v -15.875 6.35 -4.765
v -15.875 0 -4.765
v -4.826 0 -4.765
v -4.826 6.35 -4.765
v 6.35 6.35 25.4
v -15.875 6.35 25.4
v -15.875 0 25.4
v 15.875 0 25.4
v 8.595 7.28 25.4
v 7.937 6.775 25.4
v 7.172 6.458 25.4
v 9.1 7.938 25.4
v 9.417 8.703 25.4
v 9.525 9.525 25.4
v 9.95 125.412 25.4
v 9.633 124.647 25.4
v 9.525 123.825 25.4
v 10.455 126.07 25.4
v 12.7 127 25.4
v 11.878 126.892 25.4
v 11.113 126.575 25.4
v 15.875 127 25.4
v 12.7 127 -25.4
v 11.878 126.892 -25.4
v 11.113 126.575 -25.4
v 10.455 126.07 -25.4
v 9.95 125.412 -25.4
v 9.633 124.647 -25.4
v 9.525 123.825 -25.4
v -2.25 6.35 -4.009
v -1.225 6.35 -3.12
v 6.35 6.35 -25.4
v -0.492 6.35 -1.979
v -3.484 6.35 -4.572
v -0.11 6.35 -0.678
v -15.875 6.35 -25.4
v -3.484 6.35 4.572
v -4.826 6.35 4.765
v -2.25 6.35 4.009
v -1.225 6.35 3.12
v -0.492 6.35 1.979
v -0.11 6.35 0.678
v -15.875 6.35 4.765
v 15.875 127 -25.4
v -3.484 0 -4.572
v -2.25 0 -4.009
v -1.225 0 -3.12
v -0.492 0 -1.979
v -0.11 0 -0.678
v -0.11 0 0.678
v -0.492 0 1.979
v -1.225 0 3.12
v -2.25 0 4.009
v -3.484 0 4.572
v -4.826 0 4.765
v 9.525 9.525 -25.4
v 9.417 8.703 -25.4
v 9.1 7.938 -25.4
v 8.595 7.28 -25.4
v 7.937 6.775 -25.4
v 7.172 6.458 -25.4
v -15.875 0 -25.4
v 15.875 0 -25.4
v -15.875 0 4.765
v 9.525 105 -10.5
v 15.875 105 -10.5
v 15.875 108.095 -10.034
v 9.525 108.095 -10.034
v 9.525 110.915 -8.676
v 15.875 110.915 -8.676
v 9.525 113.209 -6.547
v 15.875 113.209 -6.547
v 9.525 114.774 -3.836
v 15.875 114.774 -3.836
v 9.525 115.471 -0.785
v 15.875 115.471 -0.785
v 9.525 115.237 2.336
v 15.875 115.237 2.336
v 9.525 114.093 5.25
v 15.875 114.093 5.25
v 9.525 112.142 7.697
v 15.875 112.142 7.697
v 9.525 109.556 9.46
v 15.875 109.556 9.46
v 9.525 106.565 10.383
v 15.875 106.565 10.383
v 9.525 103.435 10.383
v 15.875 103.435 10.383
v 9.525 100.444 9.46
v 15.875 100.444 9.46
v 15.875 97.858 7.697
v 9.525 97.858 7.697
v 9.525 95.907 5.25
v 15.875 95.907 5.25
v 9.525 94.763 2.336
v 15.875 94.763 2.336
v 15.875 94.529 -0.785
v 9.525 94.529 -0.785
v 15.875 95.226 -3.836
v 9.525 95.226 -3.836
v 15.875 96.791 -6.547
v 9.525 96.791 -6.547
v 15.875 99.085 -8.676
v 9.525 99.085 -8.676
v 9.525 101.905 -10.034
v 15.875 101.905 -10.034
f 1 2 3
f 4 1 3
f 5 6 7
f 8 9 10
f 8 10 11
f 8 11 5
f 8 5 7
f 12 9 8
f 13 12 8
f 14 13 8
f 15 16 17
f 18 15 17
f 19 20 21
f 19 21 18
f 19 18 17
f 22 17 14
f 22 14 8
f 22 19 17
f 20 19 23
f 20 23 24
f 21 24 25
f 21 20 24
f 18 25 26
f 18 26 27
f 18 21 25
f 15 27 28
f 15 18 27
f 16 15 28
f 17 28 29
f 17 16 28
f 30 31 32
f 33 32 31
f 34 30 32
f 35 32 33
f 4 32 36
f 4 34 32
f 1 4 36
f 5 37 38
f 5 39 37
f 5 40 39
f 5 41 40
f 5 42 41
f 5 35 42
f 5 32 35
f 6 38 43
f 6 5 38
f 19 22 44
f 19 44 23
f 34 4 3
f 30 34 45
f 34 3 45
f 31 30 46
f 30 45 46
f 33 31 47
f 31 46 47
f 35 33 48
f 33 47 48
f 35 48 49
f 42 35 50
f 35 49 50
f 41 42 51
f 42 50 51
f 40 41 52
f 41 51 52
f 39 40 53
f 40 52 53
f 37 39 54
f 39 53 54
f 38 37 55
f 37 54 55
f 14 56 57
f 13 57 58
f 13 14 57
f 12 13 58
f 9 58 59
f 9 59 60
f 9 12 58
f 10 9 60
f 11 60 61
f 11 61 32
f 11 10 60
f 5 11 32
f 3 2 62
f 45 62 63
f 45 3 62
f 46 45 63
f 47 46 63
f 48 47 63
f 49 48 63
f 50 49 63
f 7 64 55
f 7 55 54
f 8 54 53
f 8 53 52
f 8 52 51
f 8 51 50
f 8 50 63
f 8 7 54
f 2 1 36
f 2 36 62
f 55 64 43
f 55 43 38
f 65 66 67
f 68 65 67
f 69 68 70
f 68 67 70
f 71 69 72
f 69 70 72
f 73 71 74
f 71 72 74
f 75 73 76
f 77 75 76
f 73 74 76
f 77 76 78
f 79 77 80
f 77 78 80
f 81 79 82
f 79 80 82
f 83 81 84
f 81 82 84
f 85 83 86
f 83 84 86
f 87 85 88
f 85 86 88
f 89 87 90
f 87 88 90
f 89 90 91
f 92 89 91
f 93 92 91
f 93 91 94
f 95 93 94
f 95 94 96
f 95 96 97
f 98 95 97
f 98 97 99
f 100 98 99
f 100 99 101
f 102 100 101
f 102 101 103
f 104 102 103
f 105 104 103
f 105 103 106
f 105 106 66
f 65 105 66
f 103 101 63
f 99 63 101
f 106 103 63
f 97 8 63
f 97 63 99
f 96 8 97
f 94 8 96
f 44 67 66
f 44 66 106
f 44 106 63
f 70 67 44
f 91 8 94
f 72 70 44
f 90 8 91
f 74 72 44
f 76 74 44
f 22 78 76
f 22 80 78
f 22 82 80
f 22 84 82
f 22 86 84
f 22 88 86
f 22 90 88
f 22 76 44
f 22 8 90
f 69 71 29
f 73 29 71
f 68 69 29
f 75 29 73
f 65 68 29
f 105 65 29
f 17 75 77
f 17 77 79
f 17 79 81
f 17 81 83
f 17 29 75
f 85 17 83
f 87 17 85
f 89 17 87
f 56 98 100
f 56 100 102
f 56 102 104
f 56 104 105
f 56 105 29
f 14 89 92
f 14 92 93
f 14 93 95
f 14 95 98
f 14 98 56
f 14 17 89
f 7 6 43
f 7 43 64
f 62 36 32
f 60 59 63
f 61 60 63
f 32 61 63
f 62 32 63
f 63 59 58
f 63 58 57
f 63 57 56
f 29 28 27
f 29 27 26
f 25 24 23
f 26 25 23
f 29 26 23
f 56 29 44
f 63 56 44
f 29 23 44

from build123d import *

# Parameters (mm, degrees)
BOSS_EXTRUDE1_DEPTH = 25.4
SKETCH3_R           = 4.765
CUT_EXTRUDE1_DEPTH  = 128
SKETCH5_R           = 10.5
CUT_EXTRUDE2_DEPTH  = 10
SKETCH6_W           = 11.049
SKETCH6_H           = 9.53
CUT_EXTRUDE3_DEPTH  = 10


with BuildPart() as part:
    # Sketch2 → Boss-Extrude1 (new body, symmetric)
    with BuildSketch(Plane.XY):
        with BuildLine():
            Line((-15.875, 0), (15.875, 0))
            Line((15.875, 0), (15.875, 127))
            Line((15.875, 127), (12.7, 127))
            ThreePointArc((12.7, 127), (10.45493597, 126.07006403), (9.525, 123.825))
            Line((9.525, 123.825), (9.525, 9.525))
            ThreePointArc((9.525, 9.525), (8.59506403, 7.27993597), (6.35, 6.35))
            Line((6.35, 6.35), (-12.7, 6.35))
            Line((-12.7, 6.35), (-15.875, 6.35))
            Line((-15.875, 6.35), (-15.875, 3.175))
            Line((-15.875, 3.175), (-15.875, 0))
        make_face()
    extrude(amount=BOSS_EXTRUDE1_DEPTH, both=True)

    # Sketch3 → Cut-Extrude1 (cut, through all)
    with BuildSketch(Plane.XZ):
        with Locations((-4.826, 0)):
            Circle(SKETCH3_R)
    extrude(amount=-CUT_EXTRUDE1_DEPTH, mode=Mode.SUBTRACT)

    # Sketch5 → Cut-Extrude2 (cut)
    with BuildSketch(Plane(origin=(15.875, 0, 0), x_dir=(0, 0, -1), z_dir=(1, 0, 0))):
        with Locations((0, 105)):
            Circle(SKETCH5_R)
    extrude(amount=-CUT_EXTRUDE2_DEPTH, mode=Mode.SUBTRACT)

    # Sketch6 → Cut-Extrude3 (cut)
    with BuildSketch(Plane.XZ):
        with Locations((-10.3505, 0)):
            Rectangle(SKETCH6_W, SKETCH6_H)
    extrude(amount=-CUT_EXTRUDE3_DEPTH, mode=Mode.SUBTRACT)


solid = part.part
